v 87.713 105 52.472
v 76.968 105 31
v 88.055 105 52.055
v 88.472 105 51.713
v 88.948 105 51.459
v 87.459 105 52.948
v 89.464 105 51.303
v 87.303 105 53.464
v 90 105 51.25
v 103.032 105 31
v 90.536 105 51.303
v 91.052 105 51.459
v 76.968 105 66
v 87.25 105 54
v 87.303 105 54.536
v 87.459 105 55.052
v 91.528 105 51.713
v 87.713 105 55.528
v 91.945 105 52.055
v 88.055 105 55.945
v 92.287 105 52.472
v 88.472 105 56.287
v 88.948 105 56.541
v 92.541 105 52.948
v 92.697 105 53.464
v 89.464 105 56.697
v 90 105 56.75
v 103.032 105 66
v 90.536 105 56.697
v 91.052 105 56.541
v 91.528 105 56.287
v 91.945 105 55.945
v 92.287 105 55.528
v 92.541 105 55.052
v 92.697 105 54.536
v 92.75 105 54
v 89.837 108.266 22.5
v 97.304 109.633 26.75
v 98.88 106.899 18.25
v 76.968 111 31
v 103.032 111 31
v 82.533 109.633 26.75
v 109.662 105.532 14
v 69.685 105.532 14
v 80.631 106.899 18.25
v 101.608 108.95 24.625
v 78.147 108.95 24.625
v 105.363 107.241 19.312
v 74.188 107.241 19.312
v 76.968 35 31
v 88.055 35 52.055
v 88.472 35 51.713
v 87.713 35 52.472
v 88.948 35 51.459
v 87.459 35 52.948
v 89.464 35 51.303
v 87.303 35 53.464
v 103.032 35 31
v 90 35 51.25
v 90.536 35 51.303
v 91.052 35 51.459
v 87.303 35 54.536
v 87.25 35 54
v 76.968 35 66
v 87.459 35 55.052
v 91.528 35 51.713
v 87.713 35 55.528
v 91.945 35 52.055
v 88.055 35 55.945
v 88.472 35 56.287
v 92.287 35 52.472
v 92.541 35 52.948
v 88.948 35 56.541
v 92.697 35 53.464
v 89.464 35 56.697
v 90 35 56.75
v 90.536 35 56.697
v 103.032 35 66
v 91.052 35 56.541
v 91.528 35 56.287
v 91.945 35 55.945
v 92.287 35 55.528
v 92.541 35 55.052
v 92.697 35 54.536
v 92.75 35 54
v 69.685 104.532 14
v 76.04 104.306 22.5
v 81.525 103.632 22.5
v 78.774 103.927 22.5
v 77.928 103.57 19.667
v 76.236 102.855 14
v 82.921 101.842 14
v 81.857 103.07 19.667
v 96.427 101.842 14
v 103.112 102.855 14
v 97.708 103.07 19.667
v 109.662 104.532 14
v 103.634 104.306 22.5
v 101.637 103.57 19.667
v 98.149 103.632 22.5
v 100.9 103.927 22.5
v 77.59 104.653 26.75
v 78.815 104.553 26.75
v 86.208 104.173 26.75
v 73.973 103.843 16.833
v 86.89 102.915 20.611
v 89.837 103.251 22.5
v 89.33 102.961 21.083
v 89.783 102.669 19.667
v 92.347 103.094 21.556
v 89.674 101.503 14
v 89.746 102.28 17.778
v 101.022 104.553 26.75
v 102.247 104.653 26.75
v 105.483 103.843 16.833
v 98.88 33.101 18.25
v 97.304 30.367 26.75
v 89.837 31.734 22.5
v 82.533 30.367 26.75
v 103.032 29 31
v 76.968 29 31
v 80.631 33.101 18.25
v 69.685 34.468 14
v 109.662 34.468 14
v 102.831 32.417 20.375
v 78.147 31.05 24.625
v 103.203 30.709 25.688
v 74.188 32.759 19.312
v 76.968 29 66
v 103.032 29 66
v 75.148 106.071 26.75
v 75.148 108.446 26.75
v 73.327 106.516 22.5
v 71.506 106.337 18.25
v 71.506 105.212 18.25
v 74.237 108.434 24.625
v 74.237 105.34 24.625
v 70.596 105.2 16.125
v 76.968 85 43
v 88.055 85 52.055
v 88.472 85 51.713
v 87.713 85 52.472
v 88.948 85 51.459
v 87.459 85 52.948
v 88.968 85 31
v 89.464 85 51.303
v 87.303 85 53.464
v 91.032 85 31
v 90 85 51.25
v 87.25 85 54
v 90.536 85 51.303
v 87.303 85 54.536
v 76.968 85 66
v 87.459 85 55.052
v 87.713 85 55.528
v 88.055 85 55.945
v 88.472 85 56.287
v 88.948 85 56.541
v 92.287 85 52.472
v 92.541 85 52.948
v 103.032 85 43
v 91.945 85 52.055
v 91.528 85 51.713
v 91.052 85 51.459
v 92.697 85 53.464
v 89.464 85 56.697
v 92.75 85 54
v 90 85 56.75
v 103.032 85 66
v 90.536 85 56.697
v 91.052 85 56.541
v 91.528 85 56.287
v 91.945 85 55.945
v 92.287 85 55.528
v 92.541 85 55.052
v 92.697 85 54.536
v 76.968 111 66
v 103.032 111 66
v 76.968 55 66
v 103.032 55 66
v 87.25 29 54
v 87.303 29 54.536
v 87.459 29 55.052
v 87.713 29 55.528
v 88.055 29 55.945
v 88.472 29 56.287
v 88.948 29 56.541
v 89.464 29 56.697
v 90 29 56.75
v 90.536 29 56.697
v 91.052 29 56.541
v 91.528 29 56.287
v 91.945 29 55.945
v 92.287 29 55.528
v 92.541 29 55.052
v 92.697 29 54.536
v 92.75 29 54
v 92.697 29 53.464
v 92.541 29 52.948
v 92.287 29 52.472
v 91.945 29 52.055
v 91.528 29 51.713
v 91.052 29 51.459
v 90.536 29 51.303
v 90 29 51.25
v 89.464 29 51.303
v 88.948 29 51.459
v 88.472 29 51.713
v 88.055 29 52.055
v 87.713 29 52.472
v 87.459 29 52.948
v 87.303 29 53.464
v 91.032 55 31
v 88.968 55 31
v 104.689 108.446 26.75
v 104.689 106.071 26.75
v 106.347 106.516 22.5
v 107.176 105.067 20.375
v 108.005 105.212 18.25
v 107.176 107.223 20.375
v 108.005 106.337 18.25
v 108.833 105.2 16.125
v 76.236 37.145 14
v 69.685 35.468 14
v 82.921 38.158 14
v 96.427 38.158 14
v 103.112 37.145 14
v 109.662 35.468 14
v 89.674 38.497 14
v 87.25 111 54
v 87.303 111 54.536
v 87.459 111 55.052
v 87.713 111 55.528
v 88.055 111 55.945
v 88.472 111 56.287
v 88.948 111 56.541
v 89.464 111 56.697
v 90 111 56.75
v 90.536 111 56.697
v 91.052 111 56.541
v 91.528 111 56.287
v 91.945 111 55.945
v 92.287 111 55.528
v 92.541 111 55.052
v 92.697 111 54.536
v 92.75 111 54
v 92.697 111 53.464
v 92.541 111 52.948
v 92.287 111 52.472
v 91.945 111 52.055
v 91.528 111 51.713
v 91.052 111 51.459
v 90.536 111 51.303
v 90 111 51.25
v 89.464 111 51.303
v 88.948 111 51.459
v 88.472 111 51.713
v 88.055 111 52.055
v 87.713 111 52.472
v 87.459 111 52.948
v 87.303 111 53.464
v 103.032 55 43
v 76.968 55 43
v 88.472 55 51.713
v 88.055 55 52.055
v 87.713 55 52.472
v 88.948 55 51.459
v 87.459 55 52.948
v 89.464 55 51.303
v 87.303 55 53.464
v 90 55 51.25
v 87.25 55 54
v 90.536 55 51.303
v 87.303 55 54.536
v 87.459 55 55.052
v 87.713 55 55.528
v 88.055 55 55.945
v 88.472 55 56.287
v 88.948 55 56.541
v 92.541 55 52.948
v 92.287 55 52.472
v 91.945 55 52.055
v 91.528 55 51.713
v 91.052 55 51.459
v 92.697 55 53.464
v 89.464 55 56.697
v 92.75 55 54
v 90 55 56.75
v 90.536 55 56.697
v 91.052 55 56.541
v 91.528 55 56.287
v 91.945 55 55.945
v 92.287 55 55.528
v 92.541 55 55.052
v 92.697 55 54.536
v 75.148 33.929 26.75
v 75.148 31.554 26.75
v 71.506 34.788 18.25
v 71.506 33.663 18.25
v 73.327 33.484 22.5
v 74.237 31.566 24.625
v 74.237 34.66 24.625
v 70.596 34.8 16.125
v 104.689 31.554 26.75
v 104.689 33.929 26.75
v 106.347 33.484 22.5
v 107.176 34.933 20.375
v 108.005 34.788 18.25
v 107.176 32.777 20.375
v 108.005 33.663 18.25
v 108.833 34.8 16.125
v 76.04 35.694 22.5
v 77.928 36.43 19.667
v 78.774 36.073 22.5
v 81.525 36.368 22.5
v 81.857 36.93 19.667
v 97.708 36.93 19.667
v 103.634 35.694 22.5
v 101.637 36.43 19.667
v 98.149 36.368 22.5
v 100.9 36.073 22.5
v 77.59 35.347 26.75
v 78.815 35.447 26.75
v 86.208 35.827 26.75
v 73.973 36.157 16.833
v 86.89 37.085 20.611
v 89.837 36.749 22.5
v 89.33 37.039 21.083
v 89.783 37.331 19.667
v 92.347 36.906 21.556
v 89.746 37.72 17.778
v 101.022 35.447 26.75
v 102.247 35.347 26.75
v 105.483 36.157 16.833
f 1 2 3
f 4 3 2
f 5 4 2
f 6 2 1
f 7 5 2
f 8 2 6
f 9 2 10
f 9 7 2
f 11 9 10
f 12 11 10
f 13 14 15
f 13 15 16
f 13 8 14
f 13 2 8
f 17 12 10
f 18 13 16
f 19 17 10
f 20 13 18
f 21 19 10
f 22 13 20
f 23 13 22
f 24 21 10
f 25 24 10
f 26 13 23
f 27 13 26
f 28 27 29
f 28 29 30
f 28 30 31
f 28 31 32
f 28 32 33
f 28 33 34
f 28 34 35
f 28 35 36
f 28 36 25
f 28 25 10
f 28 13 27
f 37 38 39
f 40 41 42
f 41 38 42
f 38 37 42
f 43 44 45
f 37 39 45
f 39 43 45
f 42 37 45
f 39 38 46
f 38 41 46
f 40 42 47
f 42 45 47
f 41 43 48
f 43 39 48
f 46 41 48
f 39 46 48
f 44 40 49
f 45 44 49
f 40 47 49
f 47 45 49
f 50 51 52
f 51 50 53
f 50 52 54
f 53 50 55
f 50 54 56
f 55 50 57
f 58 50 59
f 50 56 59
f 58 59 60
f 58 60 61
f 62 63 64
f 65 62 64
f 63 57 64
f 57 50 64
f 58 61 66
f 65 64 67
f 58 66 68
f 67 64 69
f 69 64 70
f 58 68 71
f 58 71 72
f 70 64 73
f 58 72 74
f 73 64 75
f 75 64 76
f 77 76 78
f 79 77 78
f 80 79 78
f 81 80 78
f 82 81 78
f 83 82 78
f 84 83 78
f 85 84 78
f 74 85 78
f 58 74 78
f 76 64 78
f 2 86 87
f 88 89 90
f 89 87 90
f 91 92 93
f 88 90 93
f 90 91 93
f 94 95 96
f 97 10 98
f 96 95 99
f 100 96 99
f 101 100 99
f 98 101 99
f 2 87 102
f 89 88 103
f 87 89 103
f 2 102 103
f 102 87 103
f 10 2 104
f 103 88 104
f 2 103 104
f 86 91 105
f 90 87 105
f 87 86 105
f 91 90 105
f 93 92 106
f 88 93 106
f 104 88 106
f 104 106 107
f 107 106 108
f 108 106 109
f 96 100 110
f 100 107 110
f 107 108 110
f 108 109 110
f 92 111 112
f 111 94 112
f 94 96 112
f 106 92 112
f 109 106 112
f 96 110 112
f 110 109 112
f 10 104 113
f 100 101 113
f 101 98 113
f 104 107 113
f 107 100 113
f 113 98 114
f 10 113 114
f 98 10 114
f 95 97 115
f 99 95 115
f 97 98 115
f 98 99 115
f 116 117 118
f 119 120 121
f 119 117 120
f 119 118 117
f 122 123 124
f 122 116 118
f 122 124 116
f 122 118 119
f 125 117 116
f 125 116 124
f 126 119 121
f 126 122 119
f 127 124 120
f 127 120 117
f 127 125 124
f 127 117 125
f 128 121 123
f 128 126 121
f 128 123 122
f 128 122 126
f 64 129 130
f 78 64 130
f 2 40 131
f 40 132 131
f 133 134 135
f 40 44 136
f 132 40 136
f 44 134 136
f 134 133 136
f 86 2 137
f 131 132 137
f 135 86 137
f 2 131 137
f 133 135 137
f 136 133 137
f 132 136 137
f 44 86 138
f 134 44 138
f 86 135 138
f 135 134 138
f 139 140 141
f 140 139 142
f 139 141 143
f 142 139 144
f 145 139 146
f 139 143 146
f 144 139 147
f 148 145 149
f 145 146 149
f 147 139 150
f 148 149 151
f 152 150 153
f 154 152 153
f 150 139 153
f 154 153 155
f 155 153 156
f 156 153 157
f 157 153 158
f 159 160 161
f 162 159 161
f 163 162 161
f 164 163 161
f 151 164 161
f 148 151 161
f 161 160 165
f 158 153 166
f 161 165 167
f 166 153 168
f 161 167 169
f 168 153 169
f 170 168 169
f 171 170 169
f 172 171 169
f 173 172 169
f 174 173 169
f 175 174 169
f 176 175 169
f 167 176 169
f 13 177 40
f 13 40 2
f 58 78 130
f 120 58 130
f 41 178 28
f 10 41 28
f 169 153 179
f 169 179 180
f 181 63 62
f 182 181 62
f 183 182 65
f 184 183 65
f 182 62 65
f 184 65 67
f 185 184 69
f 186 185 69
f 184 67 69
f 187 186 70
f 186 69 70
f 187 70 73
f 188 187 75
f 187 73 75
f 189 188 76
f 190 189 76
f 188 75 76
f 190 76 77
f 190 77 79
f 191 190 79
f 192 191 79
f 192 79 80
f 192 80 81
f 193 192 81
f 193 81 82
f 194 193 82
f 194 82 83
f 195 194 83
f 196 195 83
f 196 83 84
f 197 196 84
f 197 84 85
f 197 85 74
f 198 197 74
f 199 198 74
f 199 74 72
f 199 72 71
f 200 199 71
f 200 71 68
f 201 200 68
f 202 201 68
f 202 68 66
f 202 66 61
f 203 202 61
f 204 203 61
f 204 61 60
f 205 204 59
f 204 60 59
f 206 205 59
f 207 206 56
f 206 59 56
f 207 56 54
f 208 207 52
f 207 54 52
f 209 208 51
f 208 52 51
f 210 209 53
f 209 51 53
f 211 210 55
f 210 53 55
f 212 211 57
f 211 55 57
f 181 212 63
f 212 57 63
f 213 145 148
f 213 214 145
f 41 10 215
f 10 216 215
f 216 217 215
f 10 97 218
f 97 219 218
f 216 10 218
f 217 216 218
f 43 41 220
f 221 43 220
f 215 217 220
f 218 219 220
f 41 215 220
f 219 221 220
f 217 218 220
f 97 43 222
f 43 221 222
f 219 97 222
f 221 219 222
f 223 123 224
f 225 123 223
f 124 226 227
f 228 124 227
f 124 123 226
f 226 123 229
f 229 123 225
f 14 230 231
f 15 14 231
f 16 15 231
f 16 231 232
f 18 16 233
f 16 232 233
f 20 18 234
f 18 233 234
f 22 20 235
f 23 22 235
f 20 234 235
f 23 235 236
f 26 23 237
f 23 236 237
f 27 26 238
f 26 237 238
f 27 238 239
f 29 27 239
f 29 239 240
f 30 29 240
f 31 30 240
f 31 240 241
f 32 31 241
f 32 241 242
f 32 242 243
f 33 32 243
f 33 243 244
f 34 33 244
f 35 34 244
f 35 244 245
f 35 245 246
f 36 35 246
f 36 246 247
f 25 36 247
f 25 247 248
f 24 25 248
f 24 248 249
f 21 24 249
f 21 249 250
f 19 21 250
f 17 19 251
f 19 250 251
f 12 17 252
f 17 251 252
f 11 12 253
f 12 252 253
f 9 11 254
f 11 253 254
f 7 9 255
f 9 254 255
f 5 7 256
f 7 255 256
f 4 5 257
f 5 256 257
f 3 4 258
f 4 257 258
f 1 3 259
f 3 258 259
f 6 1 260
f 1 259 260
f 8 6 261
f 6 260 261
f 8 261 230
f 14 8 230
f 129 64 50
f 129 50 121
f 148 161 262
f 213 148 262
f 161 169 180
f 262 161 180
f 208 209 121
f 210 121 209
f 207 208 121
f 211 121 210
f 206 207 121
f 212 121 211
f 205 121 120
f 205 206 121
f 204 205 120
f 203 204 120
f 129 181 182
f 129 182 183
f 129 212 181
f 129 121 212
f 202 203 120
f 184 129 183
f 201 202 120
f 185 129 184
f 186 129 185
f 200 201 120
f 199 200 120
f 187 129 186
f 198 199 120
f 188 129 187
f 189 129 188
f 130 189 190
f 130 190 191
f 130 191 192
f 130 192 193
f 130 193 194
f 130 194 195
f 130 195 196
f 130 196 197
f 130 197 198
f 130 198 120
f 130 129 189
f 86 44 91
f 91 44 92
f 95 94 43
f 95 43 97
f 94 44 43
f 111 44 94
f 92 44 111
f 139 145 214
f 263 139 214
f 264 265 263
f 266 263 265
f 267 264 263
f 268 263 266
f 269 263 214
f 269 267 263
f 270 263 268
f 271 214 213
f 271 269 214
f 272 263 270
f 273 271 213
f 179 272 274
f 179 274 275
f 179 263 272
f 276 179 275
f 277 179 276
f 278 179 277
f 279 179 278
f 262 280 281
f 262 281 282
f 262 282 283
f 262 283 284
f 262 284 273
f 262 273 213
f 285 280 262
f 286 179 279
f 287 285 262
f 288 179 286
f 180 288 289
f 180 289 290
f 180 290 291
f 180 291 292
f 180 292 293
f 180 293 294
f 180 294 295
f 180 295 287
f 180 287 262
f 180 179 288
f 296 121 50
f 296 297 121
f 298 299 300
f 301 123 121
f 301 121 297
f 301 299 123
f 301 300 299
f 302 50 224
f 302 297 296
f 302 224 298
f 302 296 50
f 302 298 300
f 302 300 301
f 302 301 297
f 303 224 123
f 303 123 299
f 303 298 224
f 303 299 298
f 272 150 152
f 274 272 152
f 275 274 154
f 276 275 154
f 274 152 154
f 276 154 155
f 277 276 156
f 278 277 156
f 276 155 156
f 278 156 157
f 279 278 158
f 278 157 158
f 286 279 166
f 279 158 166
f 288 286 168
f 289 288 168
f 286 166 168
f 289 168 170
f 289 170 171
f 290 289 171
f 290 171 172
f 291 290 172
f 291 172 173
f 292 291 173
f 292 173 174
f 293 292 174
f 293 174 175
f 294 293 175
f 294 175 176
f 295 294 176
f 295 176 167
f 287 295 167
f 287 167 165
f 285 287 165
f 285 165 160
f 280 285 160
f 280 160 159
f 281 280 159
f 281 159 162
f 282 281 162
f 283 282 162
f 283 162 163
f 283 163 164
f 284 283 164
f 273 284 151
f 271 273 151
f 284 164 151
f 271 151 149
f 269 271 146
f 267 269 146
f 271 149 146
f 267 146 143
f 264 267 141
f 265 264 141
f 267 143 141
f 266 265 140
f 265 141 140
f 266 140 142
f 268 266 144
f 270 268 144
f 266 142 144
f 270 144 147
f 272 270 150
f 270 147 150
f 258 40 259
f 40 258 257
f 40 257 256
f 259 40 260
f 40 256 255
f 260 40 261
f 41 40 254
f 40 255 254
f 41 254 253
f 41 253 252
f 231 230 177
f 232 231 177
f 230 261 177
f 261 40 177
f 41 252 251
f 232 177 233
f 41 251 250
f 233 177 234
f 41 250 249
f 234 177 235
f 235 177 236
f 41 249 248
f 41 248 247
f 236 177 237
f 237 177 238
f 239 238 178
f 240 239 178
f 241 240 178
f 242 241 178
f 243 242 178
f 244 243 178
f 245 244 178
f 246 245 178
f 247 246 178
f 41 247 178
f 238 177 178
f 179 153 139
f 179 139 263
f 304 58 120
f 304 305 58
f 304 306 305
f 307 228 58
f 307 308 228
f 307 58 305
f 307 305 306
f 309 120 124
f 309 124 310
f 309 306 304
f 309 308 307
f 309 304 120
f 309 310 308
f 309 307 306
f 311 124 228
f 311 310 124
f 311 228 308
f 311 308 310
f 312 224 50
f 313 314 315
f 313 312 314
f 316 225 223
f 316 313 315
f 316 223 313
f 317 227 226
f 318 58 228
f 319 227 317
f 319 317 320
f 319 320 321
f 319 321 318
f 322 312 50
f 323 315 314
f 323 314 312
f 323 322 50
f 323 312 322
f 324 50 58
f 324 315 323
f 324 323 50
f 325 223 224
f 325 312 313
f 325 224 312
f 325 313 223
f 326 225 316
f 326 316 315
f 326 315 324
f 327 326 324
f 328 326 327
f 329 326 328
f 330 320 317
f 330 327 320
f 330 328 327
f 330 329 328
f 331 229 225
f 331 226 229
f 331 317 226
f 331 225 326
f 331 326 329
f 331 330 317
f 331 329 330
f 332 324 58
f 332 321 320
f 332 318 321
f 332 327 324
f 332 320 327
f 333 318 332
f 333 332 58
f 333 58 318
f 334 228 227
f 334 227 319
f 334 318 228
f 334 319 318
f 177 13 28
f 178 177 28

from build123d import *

# Parameters (mm, degrees)
FACEBINDER_W                                        = 6
FACEBINDER_H                                        = 26.06345
SKETCH005_AS_DRAWN_R                                = 2.75
EXTRUDE_SKETCH005001_DEPTH                          = 90
EXTRUDE_SKETCH005001_ONTO_SKETCH005_ROLL_ANGLE      = 90
EXTRUDE_SKETCH005001_ONTO_SKETCH005_PLACEMENT_ANGLE = 180
SKETCH004_W                                         = 26.06345
SKETCH004_H                                         = 6
SKETCH004_H_2                                       = 30
EXTRUDE_SKETCH004_DEPTH                             = 35
CHAMFER_SIZE                                        = 12


with BuildPart() as loft_body:
    # Facebinder → Loft section 0
    with BuildSketch(Plane(origin=(90, 32, 31), x_dir=(0, -1, 0), z_dir=(0, 0, -1))):
        Rectangle(FACEBINDER_W, FACEBINDER_H)
    # Sketch006 → Loft section 1
    with BuildSketch(Plane(origin=(0, 0, 14), x_dir=(1, 0, 0), z_dir=(0, 0, -1))):
        with BuildLine():
            ThreePointArc((69.685404, -35.467912), (89.673813, -38.497232), (109.662222, -35.467912))
            Line((109.662222, -35.467912), (109.662222, -34.467912))
            Line((109.662222, -34.467912), (69.685404, -34.467912))
            Line((69.685404, -34.467912), (69.685404, -35.467912))
        make_face()
    loft()


with BuildPart() as part_mirroring:
    # Part__Mirroring: instance of Loft body
    add(loft_body.part.mirror(Plane(origin=(0, 0, 0), x_dir=(1, 0, 0), z_dir=(0, 1, 0))))


with BuildPart() as part_mirroring_1:
    # Part__Mirroring placement: moved
    add(part_mirroring.part.moved(Location((0, 140, 0))))


with BuildPart() as fusion001:
    # Fusion001 base: copy of Loft body
    add(loft_body.part)

    # Fusion001: union Part__Mirroring
    add(part_mirroring_1.part)


with BuildPart() as sketch005_extrude001:
    # Sketch005 as drawn → Extrude_Sketch005001 (new)
    with BuildSketch(Plane.XY):
        with Locations((-90, 54)):
            Circle(SKETCH005_AS_DRAWN_R)
    extrude(amount=-EXTRUDE_SKETCH005001_DEPTH)


with BuildPart() as sketch005_extrude001_1:
    # Extrude_Sketch005001 onto Sketch005 roll: moved
    add(sketch005_extrude001.part.rotate(Axis((0, 0, 0), (1, 0, 0)), EXTRUDE_SKETCH005001_ONTO_SKETCH005_ROLL_ANGLE))


with BuildPart() as sketch005_extrude001_2:
    # Extrude_Sketch005001 onto Sketch005 placement: moved
    add(sketch005_extrude001_1.part.moved(Location((0, 111, 0))).rotate(Axis((0, 111, 0), (0, 0, 1)), EXTRUDE_SKETCH005001_ONTO_SKETCH005_PLACEMENT_ANGLE))


with BuildPart() as chamfer_body:
    # Sketch004 → Extrude_Sketch004 (new body)
    with BuildSketch(Plane(origin=(0, 0, 66), x_dir=(1, 0, 0), z_dir=(0, 0, -1))):
        with Locations((90, -108)):
            Rectangle(SKETCH004_W, SKETCH004_H)
        with Locations((90, -70)):
            Rectangle(SKETCH004_W, SKETCH004_H_2)
        with Locations((90, -32)):
            Rectangle(SKETCH004_W, SKETCH004_H)
    extrude(amount=EXTRUDE_SKETCH004_DEPTH)

    # Cut002: cut Sketch005_Extrude001
    add(sketch005_extrude001_2.part, mode=Mode.SUBTRACT)

    # Fusion002: union Fusion001
    add(fusion001.part)

    # Chamfer
    chamfer_edges = [chamfer_body.edges().sort_by_distance(p)[0] for p in [
        (103.031725, 70, 31),
        (76.968275, 70, 31),
    ]]
    chamfer(chamfer_edges, length=CHAMFER_SIZE)


solid = chamfer_body.part
